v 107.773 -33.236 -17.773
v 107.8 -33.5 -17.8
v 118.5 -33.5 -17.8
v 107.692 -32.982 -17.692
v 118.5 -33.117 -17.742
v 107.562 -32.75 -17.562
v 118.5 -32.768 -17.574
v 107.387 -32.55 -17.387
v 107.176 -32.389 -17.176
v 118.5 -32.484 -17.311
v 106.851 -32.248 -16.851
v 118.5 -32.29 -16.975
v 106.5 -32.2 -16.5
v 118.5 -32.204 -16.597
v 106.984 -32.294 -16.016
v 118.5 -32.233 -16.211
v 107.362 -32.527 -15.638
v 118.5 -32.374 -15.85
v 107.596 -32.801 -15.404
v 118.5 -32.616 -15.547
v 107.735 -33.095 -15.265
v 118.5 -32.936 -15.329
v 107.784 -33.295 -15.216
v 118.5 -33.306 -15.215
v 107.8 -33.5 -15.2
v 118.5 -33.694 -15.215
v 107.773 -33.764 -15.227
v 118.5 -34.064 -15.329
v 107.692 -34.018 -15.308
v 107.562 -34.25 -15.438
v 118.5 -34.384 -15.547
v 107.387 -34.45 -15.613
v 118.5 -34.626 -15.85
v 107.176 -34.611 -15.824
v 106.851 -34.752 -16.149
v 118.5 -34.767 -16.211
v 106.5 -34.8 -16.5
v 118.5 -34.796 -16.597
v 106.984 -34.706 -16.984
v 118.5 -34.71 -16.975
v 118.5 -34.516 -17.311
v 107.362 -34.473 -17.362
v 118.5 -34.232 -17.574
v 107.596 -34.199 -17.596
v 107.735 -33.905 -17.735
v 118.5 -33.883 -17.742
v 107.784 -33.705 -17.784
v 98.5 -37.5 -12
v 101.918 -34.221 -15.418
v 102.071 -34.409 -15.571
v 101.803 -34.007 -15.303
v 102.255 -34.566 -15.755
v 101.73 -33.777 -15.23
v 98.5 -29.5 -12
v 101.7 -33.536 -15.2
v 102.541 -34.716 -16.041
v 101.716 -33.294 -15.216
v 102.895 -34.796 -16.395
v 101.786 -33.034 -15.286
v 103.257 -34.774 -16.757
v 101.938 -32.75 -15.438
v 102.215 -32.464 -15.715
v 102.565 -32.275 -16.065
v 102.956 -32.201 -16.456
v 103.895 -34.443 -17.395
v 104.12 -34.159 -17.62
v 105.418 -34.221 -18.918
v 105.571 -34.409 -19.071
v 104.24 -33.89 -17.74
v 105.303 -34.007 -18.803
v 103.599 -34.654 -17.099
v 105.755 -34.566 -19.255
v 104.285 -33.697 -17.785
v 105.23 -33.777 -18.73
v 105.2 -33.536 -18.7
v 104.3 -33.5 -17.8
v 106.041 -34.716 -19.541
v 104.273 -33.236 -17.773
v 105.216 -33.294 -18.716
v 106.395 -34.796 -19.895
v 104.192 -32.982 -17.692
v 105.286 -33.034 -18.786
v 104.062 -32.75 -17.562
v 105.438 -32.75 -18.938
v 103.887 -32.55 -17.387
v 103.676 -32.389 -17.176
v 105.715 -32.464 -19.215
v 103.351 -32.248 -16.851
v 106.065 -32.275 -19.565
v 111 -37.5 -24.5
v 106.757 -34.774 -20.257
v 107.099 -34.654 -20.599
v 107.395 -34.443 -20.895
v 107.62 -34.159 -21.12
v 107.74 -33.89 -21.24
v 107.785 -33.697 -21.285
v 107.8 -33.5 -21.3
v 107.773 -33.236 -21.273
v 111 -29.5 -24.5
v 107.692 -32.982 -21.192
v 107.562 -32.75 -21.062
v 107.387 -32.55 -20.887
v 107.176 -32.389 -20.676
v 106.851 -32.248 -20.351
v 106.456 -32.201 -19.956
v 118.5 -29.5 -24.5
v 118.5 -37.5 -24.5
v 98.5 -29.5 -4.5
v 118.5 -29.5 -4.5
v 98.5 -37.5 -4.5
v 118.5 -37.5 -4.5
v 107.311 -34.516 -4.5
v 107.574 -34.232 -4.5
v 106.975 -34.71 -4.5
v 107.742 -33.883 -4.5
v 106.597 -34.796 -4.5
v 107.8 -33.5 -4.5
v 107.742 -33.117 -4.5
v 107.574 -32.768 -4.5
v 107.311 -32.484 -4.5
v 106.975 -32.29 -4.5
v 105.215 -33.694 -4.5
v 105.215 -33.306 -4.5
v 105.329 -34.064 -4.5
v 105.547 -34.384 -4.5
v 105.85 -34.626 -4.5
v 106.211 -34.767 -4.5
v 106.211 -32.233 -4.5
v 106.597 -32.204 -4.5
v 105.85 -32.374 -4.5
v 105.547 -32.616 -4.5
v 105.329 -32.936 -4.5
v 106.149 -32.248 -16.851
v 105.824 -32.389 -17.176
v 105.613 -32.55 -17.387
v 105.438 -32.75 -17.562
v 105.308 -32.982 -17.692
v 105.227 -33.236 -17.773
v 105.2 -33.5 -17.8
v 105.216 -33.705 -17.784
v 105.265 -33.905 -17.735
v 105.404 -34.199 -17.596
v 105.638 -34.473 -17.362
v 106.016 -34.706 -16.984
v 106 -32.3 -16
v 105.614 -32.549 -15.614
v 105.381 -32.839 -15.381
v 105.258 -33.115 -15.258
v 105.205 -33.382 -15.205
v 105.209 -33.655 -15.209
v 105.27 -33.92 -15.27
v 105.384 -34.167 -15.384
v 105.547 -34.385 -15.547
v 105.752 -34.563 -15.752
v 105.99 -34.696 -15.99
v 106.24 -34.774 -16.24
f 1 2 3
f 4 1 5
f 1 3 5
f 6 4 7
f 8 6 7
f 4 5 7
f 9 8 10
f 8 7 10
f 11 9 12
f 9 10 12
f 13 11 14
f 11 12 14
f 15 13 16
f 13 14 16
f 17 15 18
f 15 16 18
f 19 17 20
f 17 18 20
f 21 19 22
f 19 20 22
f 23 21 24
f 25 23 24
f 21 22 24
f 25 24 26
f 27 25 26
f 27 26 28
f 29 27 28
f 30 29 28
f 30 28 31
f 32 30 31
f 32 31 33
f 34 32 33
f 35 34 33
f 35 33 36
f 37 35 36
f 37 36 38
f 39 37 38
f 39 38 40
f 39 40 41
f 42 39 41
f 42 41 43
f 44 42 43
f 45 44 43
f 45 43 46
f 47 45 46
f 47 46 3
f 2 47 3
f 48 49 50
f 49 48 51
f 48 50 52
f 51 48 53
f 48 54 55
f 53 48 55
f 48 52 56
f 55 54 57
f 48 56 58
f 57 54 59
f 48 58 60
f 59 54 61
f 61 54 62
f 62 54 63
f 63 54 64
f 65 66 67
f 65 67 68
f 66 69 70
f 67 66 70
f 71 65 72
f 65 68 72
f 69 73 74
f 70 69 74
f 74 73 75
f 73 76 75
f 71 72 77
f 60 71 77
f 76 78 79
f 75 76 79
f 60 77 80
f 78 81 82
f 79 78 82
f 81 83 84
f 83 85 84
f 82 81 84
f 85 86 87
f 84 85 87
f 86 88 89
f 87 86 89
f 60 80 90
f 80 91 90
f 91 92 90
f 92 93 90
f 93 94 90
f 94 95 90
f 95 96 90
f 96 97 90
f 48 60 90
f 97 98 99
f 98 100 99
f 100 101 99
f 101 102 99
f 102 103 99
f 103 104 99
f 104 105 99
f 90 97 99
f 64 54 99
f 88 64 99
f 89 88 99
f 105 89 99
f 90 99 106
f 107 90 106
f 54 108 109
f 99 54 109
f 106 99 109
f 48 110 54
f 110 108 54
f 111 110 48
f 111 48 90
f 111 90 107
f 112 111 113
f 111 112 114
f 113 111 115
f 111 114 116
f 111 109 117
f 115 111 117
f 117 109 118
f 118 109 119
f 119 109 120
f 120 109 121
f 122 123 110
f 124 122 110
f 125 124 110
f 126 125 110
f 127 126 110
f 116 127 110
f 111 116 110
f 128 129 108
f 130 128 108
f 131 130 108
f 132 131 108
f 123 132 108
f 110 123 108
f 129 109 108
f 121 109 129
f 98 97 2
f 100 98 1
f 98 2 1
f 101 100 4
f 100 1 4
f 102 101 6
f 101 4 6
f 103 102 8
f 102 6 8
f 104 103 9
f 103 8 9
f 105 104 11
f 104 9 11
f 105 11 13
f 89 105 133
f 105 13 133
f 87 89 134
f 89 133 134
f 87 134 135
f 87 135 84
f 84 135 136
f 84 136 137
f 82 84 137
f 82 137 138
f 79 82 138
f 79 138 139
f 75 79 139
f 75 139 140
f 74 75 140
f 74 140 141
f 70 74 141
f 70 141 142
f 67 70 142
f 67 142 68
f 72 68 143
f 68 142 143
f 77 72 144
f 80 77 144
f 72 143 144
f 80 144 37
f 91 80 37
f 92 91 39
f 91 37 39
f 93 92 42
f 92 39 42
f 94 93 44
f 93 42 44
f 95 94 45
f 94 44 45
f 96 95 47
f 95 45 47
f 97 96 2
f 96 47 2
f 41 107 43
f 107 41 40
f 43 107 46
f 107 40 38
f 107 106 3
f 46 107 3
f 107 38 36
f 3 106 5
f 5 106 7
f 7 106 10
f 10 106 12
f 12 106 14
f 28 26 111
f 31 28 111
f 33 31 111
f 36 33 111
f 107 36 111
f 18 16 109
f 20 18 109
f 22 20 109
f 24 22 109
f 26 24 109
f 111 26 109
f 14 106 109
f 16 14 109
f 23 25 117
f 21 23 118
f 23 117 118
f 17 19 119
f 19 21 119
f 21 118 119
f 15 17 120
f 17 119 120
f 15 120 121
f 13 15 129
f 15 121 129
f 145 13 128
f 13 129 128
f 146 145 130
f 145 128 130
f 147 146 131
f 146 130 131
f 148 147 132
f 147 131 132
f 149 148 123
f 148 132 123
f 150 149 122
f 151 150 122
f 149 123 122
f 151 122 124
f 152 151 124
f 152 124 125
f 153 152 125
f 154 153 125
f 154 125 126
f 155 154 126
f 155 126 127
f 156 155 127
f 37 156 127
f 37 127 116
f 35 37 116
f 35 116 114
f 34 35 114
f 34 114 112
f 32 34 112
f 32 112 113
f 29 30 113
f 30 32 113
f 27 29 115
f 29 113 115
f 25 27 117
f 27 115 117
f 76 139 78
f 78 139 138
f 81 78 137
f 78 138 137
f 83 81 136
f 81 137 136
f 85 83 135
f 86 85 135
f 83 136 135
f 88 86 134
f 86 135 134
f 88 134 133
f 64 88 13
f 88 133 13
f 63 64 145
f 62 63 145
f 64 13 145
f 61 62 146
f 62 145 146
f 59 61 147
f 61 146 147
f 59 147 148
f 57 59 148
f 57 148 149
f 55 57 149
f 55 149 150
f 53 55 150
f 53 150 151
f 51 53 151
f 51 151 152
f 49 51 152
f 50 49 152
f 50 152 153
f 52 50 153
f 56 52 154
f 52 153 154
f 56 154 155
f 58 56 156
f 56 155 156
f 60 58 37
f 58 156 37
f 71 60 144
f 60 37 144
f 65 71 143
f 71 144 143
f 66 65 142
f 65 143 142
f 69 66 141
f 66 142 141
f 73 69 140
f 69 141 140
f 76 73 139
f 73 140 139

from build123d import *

# Parameters (mm, degrees)
PAD024_DEPTH      = 4
PAD024_DEPTH_BACK = 4
SKETCH047_R       = 1.3
POCKET_DEPTH      = 20.001
SKETCH048_R       = 1.3
POCKET001_DEPTH   = 20.001


with BuildPart() as part:
    # Sketch046 → Pad024 (new body, two sides)
    with BuildSketch(Plane(origin=(118.5, -33.5, -4.5), x_dir=(-1, 0, 0), z_dir=(0, 1, 0))) as pad024_sk:
        Polygon((0, 0), (20, 0), (20, -7.5), (7.5, -20), (0, -20), align=None)
    extrude(amount=PAD024_DEPTH)
    extrude(pad024_sk.sketch, amount=-PAD024_DEPTH_BACK)

    # Sketch047 → Pocket (cut, through all)
    with BuildSketch(Plane(origin=(118.5, -33.5, -4.5), x_dir=(0, 0, -1), z_dir=(1, 0, 0))):
        with Locations((12, 0)):
            Circle(SKETCH047_R)
    extrude(amount=-POCKET_DEPTH, mode=Mode.SUBTRACT)

    # Sketch048 → Pocket001 (cut, through all)
    with BuildSketch(Plane(origin=(118.5, -33.5, -4.5), x_dir=(1, 0, 0), z_dir=(0, 0, 1))):
        with Locations((-12, 0)):
            Circle(SKETCH048_R)
    extrude(amount=-POCKET001_DEPTH, mode=Mode.SUBTRACT)


solid = part.part
